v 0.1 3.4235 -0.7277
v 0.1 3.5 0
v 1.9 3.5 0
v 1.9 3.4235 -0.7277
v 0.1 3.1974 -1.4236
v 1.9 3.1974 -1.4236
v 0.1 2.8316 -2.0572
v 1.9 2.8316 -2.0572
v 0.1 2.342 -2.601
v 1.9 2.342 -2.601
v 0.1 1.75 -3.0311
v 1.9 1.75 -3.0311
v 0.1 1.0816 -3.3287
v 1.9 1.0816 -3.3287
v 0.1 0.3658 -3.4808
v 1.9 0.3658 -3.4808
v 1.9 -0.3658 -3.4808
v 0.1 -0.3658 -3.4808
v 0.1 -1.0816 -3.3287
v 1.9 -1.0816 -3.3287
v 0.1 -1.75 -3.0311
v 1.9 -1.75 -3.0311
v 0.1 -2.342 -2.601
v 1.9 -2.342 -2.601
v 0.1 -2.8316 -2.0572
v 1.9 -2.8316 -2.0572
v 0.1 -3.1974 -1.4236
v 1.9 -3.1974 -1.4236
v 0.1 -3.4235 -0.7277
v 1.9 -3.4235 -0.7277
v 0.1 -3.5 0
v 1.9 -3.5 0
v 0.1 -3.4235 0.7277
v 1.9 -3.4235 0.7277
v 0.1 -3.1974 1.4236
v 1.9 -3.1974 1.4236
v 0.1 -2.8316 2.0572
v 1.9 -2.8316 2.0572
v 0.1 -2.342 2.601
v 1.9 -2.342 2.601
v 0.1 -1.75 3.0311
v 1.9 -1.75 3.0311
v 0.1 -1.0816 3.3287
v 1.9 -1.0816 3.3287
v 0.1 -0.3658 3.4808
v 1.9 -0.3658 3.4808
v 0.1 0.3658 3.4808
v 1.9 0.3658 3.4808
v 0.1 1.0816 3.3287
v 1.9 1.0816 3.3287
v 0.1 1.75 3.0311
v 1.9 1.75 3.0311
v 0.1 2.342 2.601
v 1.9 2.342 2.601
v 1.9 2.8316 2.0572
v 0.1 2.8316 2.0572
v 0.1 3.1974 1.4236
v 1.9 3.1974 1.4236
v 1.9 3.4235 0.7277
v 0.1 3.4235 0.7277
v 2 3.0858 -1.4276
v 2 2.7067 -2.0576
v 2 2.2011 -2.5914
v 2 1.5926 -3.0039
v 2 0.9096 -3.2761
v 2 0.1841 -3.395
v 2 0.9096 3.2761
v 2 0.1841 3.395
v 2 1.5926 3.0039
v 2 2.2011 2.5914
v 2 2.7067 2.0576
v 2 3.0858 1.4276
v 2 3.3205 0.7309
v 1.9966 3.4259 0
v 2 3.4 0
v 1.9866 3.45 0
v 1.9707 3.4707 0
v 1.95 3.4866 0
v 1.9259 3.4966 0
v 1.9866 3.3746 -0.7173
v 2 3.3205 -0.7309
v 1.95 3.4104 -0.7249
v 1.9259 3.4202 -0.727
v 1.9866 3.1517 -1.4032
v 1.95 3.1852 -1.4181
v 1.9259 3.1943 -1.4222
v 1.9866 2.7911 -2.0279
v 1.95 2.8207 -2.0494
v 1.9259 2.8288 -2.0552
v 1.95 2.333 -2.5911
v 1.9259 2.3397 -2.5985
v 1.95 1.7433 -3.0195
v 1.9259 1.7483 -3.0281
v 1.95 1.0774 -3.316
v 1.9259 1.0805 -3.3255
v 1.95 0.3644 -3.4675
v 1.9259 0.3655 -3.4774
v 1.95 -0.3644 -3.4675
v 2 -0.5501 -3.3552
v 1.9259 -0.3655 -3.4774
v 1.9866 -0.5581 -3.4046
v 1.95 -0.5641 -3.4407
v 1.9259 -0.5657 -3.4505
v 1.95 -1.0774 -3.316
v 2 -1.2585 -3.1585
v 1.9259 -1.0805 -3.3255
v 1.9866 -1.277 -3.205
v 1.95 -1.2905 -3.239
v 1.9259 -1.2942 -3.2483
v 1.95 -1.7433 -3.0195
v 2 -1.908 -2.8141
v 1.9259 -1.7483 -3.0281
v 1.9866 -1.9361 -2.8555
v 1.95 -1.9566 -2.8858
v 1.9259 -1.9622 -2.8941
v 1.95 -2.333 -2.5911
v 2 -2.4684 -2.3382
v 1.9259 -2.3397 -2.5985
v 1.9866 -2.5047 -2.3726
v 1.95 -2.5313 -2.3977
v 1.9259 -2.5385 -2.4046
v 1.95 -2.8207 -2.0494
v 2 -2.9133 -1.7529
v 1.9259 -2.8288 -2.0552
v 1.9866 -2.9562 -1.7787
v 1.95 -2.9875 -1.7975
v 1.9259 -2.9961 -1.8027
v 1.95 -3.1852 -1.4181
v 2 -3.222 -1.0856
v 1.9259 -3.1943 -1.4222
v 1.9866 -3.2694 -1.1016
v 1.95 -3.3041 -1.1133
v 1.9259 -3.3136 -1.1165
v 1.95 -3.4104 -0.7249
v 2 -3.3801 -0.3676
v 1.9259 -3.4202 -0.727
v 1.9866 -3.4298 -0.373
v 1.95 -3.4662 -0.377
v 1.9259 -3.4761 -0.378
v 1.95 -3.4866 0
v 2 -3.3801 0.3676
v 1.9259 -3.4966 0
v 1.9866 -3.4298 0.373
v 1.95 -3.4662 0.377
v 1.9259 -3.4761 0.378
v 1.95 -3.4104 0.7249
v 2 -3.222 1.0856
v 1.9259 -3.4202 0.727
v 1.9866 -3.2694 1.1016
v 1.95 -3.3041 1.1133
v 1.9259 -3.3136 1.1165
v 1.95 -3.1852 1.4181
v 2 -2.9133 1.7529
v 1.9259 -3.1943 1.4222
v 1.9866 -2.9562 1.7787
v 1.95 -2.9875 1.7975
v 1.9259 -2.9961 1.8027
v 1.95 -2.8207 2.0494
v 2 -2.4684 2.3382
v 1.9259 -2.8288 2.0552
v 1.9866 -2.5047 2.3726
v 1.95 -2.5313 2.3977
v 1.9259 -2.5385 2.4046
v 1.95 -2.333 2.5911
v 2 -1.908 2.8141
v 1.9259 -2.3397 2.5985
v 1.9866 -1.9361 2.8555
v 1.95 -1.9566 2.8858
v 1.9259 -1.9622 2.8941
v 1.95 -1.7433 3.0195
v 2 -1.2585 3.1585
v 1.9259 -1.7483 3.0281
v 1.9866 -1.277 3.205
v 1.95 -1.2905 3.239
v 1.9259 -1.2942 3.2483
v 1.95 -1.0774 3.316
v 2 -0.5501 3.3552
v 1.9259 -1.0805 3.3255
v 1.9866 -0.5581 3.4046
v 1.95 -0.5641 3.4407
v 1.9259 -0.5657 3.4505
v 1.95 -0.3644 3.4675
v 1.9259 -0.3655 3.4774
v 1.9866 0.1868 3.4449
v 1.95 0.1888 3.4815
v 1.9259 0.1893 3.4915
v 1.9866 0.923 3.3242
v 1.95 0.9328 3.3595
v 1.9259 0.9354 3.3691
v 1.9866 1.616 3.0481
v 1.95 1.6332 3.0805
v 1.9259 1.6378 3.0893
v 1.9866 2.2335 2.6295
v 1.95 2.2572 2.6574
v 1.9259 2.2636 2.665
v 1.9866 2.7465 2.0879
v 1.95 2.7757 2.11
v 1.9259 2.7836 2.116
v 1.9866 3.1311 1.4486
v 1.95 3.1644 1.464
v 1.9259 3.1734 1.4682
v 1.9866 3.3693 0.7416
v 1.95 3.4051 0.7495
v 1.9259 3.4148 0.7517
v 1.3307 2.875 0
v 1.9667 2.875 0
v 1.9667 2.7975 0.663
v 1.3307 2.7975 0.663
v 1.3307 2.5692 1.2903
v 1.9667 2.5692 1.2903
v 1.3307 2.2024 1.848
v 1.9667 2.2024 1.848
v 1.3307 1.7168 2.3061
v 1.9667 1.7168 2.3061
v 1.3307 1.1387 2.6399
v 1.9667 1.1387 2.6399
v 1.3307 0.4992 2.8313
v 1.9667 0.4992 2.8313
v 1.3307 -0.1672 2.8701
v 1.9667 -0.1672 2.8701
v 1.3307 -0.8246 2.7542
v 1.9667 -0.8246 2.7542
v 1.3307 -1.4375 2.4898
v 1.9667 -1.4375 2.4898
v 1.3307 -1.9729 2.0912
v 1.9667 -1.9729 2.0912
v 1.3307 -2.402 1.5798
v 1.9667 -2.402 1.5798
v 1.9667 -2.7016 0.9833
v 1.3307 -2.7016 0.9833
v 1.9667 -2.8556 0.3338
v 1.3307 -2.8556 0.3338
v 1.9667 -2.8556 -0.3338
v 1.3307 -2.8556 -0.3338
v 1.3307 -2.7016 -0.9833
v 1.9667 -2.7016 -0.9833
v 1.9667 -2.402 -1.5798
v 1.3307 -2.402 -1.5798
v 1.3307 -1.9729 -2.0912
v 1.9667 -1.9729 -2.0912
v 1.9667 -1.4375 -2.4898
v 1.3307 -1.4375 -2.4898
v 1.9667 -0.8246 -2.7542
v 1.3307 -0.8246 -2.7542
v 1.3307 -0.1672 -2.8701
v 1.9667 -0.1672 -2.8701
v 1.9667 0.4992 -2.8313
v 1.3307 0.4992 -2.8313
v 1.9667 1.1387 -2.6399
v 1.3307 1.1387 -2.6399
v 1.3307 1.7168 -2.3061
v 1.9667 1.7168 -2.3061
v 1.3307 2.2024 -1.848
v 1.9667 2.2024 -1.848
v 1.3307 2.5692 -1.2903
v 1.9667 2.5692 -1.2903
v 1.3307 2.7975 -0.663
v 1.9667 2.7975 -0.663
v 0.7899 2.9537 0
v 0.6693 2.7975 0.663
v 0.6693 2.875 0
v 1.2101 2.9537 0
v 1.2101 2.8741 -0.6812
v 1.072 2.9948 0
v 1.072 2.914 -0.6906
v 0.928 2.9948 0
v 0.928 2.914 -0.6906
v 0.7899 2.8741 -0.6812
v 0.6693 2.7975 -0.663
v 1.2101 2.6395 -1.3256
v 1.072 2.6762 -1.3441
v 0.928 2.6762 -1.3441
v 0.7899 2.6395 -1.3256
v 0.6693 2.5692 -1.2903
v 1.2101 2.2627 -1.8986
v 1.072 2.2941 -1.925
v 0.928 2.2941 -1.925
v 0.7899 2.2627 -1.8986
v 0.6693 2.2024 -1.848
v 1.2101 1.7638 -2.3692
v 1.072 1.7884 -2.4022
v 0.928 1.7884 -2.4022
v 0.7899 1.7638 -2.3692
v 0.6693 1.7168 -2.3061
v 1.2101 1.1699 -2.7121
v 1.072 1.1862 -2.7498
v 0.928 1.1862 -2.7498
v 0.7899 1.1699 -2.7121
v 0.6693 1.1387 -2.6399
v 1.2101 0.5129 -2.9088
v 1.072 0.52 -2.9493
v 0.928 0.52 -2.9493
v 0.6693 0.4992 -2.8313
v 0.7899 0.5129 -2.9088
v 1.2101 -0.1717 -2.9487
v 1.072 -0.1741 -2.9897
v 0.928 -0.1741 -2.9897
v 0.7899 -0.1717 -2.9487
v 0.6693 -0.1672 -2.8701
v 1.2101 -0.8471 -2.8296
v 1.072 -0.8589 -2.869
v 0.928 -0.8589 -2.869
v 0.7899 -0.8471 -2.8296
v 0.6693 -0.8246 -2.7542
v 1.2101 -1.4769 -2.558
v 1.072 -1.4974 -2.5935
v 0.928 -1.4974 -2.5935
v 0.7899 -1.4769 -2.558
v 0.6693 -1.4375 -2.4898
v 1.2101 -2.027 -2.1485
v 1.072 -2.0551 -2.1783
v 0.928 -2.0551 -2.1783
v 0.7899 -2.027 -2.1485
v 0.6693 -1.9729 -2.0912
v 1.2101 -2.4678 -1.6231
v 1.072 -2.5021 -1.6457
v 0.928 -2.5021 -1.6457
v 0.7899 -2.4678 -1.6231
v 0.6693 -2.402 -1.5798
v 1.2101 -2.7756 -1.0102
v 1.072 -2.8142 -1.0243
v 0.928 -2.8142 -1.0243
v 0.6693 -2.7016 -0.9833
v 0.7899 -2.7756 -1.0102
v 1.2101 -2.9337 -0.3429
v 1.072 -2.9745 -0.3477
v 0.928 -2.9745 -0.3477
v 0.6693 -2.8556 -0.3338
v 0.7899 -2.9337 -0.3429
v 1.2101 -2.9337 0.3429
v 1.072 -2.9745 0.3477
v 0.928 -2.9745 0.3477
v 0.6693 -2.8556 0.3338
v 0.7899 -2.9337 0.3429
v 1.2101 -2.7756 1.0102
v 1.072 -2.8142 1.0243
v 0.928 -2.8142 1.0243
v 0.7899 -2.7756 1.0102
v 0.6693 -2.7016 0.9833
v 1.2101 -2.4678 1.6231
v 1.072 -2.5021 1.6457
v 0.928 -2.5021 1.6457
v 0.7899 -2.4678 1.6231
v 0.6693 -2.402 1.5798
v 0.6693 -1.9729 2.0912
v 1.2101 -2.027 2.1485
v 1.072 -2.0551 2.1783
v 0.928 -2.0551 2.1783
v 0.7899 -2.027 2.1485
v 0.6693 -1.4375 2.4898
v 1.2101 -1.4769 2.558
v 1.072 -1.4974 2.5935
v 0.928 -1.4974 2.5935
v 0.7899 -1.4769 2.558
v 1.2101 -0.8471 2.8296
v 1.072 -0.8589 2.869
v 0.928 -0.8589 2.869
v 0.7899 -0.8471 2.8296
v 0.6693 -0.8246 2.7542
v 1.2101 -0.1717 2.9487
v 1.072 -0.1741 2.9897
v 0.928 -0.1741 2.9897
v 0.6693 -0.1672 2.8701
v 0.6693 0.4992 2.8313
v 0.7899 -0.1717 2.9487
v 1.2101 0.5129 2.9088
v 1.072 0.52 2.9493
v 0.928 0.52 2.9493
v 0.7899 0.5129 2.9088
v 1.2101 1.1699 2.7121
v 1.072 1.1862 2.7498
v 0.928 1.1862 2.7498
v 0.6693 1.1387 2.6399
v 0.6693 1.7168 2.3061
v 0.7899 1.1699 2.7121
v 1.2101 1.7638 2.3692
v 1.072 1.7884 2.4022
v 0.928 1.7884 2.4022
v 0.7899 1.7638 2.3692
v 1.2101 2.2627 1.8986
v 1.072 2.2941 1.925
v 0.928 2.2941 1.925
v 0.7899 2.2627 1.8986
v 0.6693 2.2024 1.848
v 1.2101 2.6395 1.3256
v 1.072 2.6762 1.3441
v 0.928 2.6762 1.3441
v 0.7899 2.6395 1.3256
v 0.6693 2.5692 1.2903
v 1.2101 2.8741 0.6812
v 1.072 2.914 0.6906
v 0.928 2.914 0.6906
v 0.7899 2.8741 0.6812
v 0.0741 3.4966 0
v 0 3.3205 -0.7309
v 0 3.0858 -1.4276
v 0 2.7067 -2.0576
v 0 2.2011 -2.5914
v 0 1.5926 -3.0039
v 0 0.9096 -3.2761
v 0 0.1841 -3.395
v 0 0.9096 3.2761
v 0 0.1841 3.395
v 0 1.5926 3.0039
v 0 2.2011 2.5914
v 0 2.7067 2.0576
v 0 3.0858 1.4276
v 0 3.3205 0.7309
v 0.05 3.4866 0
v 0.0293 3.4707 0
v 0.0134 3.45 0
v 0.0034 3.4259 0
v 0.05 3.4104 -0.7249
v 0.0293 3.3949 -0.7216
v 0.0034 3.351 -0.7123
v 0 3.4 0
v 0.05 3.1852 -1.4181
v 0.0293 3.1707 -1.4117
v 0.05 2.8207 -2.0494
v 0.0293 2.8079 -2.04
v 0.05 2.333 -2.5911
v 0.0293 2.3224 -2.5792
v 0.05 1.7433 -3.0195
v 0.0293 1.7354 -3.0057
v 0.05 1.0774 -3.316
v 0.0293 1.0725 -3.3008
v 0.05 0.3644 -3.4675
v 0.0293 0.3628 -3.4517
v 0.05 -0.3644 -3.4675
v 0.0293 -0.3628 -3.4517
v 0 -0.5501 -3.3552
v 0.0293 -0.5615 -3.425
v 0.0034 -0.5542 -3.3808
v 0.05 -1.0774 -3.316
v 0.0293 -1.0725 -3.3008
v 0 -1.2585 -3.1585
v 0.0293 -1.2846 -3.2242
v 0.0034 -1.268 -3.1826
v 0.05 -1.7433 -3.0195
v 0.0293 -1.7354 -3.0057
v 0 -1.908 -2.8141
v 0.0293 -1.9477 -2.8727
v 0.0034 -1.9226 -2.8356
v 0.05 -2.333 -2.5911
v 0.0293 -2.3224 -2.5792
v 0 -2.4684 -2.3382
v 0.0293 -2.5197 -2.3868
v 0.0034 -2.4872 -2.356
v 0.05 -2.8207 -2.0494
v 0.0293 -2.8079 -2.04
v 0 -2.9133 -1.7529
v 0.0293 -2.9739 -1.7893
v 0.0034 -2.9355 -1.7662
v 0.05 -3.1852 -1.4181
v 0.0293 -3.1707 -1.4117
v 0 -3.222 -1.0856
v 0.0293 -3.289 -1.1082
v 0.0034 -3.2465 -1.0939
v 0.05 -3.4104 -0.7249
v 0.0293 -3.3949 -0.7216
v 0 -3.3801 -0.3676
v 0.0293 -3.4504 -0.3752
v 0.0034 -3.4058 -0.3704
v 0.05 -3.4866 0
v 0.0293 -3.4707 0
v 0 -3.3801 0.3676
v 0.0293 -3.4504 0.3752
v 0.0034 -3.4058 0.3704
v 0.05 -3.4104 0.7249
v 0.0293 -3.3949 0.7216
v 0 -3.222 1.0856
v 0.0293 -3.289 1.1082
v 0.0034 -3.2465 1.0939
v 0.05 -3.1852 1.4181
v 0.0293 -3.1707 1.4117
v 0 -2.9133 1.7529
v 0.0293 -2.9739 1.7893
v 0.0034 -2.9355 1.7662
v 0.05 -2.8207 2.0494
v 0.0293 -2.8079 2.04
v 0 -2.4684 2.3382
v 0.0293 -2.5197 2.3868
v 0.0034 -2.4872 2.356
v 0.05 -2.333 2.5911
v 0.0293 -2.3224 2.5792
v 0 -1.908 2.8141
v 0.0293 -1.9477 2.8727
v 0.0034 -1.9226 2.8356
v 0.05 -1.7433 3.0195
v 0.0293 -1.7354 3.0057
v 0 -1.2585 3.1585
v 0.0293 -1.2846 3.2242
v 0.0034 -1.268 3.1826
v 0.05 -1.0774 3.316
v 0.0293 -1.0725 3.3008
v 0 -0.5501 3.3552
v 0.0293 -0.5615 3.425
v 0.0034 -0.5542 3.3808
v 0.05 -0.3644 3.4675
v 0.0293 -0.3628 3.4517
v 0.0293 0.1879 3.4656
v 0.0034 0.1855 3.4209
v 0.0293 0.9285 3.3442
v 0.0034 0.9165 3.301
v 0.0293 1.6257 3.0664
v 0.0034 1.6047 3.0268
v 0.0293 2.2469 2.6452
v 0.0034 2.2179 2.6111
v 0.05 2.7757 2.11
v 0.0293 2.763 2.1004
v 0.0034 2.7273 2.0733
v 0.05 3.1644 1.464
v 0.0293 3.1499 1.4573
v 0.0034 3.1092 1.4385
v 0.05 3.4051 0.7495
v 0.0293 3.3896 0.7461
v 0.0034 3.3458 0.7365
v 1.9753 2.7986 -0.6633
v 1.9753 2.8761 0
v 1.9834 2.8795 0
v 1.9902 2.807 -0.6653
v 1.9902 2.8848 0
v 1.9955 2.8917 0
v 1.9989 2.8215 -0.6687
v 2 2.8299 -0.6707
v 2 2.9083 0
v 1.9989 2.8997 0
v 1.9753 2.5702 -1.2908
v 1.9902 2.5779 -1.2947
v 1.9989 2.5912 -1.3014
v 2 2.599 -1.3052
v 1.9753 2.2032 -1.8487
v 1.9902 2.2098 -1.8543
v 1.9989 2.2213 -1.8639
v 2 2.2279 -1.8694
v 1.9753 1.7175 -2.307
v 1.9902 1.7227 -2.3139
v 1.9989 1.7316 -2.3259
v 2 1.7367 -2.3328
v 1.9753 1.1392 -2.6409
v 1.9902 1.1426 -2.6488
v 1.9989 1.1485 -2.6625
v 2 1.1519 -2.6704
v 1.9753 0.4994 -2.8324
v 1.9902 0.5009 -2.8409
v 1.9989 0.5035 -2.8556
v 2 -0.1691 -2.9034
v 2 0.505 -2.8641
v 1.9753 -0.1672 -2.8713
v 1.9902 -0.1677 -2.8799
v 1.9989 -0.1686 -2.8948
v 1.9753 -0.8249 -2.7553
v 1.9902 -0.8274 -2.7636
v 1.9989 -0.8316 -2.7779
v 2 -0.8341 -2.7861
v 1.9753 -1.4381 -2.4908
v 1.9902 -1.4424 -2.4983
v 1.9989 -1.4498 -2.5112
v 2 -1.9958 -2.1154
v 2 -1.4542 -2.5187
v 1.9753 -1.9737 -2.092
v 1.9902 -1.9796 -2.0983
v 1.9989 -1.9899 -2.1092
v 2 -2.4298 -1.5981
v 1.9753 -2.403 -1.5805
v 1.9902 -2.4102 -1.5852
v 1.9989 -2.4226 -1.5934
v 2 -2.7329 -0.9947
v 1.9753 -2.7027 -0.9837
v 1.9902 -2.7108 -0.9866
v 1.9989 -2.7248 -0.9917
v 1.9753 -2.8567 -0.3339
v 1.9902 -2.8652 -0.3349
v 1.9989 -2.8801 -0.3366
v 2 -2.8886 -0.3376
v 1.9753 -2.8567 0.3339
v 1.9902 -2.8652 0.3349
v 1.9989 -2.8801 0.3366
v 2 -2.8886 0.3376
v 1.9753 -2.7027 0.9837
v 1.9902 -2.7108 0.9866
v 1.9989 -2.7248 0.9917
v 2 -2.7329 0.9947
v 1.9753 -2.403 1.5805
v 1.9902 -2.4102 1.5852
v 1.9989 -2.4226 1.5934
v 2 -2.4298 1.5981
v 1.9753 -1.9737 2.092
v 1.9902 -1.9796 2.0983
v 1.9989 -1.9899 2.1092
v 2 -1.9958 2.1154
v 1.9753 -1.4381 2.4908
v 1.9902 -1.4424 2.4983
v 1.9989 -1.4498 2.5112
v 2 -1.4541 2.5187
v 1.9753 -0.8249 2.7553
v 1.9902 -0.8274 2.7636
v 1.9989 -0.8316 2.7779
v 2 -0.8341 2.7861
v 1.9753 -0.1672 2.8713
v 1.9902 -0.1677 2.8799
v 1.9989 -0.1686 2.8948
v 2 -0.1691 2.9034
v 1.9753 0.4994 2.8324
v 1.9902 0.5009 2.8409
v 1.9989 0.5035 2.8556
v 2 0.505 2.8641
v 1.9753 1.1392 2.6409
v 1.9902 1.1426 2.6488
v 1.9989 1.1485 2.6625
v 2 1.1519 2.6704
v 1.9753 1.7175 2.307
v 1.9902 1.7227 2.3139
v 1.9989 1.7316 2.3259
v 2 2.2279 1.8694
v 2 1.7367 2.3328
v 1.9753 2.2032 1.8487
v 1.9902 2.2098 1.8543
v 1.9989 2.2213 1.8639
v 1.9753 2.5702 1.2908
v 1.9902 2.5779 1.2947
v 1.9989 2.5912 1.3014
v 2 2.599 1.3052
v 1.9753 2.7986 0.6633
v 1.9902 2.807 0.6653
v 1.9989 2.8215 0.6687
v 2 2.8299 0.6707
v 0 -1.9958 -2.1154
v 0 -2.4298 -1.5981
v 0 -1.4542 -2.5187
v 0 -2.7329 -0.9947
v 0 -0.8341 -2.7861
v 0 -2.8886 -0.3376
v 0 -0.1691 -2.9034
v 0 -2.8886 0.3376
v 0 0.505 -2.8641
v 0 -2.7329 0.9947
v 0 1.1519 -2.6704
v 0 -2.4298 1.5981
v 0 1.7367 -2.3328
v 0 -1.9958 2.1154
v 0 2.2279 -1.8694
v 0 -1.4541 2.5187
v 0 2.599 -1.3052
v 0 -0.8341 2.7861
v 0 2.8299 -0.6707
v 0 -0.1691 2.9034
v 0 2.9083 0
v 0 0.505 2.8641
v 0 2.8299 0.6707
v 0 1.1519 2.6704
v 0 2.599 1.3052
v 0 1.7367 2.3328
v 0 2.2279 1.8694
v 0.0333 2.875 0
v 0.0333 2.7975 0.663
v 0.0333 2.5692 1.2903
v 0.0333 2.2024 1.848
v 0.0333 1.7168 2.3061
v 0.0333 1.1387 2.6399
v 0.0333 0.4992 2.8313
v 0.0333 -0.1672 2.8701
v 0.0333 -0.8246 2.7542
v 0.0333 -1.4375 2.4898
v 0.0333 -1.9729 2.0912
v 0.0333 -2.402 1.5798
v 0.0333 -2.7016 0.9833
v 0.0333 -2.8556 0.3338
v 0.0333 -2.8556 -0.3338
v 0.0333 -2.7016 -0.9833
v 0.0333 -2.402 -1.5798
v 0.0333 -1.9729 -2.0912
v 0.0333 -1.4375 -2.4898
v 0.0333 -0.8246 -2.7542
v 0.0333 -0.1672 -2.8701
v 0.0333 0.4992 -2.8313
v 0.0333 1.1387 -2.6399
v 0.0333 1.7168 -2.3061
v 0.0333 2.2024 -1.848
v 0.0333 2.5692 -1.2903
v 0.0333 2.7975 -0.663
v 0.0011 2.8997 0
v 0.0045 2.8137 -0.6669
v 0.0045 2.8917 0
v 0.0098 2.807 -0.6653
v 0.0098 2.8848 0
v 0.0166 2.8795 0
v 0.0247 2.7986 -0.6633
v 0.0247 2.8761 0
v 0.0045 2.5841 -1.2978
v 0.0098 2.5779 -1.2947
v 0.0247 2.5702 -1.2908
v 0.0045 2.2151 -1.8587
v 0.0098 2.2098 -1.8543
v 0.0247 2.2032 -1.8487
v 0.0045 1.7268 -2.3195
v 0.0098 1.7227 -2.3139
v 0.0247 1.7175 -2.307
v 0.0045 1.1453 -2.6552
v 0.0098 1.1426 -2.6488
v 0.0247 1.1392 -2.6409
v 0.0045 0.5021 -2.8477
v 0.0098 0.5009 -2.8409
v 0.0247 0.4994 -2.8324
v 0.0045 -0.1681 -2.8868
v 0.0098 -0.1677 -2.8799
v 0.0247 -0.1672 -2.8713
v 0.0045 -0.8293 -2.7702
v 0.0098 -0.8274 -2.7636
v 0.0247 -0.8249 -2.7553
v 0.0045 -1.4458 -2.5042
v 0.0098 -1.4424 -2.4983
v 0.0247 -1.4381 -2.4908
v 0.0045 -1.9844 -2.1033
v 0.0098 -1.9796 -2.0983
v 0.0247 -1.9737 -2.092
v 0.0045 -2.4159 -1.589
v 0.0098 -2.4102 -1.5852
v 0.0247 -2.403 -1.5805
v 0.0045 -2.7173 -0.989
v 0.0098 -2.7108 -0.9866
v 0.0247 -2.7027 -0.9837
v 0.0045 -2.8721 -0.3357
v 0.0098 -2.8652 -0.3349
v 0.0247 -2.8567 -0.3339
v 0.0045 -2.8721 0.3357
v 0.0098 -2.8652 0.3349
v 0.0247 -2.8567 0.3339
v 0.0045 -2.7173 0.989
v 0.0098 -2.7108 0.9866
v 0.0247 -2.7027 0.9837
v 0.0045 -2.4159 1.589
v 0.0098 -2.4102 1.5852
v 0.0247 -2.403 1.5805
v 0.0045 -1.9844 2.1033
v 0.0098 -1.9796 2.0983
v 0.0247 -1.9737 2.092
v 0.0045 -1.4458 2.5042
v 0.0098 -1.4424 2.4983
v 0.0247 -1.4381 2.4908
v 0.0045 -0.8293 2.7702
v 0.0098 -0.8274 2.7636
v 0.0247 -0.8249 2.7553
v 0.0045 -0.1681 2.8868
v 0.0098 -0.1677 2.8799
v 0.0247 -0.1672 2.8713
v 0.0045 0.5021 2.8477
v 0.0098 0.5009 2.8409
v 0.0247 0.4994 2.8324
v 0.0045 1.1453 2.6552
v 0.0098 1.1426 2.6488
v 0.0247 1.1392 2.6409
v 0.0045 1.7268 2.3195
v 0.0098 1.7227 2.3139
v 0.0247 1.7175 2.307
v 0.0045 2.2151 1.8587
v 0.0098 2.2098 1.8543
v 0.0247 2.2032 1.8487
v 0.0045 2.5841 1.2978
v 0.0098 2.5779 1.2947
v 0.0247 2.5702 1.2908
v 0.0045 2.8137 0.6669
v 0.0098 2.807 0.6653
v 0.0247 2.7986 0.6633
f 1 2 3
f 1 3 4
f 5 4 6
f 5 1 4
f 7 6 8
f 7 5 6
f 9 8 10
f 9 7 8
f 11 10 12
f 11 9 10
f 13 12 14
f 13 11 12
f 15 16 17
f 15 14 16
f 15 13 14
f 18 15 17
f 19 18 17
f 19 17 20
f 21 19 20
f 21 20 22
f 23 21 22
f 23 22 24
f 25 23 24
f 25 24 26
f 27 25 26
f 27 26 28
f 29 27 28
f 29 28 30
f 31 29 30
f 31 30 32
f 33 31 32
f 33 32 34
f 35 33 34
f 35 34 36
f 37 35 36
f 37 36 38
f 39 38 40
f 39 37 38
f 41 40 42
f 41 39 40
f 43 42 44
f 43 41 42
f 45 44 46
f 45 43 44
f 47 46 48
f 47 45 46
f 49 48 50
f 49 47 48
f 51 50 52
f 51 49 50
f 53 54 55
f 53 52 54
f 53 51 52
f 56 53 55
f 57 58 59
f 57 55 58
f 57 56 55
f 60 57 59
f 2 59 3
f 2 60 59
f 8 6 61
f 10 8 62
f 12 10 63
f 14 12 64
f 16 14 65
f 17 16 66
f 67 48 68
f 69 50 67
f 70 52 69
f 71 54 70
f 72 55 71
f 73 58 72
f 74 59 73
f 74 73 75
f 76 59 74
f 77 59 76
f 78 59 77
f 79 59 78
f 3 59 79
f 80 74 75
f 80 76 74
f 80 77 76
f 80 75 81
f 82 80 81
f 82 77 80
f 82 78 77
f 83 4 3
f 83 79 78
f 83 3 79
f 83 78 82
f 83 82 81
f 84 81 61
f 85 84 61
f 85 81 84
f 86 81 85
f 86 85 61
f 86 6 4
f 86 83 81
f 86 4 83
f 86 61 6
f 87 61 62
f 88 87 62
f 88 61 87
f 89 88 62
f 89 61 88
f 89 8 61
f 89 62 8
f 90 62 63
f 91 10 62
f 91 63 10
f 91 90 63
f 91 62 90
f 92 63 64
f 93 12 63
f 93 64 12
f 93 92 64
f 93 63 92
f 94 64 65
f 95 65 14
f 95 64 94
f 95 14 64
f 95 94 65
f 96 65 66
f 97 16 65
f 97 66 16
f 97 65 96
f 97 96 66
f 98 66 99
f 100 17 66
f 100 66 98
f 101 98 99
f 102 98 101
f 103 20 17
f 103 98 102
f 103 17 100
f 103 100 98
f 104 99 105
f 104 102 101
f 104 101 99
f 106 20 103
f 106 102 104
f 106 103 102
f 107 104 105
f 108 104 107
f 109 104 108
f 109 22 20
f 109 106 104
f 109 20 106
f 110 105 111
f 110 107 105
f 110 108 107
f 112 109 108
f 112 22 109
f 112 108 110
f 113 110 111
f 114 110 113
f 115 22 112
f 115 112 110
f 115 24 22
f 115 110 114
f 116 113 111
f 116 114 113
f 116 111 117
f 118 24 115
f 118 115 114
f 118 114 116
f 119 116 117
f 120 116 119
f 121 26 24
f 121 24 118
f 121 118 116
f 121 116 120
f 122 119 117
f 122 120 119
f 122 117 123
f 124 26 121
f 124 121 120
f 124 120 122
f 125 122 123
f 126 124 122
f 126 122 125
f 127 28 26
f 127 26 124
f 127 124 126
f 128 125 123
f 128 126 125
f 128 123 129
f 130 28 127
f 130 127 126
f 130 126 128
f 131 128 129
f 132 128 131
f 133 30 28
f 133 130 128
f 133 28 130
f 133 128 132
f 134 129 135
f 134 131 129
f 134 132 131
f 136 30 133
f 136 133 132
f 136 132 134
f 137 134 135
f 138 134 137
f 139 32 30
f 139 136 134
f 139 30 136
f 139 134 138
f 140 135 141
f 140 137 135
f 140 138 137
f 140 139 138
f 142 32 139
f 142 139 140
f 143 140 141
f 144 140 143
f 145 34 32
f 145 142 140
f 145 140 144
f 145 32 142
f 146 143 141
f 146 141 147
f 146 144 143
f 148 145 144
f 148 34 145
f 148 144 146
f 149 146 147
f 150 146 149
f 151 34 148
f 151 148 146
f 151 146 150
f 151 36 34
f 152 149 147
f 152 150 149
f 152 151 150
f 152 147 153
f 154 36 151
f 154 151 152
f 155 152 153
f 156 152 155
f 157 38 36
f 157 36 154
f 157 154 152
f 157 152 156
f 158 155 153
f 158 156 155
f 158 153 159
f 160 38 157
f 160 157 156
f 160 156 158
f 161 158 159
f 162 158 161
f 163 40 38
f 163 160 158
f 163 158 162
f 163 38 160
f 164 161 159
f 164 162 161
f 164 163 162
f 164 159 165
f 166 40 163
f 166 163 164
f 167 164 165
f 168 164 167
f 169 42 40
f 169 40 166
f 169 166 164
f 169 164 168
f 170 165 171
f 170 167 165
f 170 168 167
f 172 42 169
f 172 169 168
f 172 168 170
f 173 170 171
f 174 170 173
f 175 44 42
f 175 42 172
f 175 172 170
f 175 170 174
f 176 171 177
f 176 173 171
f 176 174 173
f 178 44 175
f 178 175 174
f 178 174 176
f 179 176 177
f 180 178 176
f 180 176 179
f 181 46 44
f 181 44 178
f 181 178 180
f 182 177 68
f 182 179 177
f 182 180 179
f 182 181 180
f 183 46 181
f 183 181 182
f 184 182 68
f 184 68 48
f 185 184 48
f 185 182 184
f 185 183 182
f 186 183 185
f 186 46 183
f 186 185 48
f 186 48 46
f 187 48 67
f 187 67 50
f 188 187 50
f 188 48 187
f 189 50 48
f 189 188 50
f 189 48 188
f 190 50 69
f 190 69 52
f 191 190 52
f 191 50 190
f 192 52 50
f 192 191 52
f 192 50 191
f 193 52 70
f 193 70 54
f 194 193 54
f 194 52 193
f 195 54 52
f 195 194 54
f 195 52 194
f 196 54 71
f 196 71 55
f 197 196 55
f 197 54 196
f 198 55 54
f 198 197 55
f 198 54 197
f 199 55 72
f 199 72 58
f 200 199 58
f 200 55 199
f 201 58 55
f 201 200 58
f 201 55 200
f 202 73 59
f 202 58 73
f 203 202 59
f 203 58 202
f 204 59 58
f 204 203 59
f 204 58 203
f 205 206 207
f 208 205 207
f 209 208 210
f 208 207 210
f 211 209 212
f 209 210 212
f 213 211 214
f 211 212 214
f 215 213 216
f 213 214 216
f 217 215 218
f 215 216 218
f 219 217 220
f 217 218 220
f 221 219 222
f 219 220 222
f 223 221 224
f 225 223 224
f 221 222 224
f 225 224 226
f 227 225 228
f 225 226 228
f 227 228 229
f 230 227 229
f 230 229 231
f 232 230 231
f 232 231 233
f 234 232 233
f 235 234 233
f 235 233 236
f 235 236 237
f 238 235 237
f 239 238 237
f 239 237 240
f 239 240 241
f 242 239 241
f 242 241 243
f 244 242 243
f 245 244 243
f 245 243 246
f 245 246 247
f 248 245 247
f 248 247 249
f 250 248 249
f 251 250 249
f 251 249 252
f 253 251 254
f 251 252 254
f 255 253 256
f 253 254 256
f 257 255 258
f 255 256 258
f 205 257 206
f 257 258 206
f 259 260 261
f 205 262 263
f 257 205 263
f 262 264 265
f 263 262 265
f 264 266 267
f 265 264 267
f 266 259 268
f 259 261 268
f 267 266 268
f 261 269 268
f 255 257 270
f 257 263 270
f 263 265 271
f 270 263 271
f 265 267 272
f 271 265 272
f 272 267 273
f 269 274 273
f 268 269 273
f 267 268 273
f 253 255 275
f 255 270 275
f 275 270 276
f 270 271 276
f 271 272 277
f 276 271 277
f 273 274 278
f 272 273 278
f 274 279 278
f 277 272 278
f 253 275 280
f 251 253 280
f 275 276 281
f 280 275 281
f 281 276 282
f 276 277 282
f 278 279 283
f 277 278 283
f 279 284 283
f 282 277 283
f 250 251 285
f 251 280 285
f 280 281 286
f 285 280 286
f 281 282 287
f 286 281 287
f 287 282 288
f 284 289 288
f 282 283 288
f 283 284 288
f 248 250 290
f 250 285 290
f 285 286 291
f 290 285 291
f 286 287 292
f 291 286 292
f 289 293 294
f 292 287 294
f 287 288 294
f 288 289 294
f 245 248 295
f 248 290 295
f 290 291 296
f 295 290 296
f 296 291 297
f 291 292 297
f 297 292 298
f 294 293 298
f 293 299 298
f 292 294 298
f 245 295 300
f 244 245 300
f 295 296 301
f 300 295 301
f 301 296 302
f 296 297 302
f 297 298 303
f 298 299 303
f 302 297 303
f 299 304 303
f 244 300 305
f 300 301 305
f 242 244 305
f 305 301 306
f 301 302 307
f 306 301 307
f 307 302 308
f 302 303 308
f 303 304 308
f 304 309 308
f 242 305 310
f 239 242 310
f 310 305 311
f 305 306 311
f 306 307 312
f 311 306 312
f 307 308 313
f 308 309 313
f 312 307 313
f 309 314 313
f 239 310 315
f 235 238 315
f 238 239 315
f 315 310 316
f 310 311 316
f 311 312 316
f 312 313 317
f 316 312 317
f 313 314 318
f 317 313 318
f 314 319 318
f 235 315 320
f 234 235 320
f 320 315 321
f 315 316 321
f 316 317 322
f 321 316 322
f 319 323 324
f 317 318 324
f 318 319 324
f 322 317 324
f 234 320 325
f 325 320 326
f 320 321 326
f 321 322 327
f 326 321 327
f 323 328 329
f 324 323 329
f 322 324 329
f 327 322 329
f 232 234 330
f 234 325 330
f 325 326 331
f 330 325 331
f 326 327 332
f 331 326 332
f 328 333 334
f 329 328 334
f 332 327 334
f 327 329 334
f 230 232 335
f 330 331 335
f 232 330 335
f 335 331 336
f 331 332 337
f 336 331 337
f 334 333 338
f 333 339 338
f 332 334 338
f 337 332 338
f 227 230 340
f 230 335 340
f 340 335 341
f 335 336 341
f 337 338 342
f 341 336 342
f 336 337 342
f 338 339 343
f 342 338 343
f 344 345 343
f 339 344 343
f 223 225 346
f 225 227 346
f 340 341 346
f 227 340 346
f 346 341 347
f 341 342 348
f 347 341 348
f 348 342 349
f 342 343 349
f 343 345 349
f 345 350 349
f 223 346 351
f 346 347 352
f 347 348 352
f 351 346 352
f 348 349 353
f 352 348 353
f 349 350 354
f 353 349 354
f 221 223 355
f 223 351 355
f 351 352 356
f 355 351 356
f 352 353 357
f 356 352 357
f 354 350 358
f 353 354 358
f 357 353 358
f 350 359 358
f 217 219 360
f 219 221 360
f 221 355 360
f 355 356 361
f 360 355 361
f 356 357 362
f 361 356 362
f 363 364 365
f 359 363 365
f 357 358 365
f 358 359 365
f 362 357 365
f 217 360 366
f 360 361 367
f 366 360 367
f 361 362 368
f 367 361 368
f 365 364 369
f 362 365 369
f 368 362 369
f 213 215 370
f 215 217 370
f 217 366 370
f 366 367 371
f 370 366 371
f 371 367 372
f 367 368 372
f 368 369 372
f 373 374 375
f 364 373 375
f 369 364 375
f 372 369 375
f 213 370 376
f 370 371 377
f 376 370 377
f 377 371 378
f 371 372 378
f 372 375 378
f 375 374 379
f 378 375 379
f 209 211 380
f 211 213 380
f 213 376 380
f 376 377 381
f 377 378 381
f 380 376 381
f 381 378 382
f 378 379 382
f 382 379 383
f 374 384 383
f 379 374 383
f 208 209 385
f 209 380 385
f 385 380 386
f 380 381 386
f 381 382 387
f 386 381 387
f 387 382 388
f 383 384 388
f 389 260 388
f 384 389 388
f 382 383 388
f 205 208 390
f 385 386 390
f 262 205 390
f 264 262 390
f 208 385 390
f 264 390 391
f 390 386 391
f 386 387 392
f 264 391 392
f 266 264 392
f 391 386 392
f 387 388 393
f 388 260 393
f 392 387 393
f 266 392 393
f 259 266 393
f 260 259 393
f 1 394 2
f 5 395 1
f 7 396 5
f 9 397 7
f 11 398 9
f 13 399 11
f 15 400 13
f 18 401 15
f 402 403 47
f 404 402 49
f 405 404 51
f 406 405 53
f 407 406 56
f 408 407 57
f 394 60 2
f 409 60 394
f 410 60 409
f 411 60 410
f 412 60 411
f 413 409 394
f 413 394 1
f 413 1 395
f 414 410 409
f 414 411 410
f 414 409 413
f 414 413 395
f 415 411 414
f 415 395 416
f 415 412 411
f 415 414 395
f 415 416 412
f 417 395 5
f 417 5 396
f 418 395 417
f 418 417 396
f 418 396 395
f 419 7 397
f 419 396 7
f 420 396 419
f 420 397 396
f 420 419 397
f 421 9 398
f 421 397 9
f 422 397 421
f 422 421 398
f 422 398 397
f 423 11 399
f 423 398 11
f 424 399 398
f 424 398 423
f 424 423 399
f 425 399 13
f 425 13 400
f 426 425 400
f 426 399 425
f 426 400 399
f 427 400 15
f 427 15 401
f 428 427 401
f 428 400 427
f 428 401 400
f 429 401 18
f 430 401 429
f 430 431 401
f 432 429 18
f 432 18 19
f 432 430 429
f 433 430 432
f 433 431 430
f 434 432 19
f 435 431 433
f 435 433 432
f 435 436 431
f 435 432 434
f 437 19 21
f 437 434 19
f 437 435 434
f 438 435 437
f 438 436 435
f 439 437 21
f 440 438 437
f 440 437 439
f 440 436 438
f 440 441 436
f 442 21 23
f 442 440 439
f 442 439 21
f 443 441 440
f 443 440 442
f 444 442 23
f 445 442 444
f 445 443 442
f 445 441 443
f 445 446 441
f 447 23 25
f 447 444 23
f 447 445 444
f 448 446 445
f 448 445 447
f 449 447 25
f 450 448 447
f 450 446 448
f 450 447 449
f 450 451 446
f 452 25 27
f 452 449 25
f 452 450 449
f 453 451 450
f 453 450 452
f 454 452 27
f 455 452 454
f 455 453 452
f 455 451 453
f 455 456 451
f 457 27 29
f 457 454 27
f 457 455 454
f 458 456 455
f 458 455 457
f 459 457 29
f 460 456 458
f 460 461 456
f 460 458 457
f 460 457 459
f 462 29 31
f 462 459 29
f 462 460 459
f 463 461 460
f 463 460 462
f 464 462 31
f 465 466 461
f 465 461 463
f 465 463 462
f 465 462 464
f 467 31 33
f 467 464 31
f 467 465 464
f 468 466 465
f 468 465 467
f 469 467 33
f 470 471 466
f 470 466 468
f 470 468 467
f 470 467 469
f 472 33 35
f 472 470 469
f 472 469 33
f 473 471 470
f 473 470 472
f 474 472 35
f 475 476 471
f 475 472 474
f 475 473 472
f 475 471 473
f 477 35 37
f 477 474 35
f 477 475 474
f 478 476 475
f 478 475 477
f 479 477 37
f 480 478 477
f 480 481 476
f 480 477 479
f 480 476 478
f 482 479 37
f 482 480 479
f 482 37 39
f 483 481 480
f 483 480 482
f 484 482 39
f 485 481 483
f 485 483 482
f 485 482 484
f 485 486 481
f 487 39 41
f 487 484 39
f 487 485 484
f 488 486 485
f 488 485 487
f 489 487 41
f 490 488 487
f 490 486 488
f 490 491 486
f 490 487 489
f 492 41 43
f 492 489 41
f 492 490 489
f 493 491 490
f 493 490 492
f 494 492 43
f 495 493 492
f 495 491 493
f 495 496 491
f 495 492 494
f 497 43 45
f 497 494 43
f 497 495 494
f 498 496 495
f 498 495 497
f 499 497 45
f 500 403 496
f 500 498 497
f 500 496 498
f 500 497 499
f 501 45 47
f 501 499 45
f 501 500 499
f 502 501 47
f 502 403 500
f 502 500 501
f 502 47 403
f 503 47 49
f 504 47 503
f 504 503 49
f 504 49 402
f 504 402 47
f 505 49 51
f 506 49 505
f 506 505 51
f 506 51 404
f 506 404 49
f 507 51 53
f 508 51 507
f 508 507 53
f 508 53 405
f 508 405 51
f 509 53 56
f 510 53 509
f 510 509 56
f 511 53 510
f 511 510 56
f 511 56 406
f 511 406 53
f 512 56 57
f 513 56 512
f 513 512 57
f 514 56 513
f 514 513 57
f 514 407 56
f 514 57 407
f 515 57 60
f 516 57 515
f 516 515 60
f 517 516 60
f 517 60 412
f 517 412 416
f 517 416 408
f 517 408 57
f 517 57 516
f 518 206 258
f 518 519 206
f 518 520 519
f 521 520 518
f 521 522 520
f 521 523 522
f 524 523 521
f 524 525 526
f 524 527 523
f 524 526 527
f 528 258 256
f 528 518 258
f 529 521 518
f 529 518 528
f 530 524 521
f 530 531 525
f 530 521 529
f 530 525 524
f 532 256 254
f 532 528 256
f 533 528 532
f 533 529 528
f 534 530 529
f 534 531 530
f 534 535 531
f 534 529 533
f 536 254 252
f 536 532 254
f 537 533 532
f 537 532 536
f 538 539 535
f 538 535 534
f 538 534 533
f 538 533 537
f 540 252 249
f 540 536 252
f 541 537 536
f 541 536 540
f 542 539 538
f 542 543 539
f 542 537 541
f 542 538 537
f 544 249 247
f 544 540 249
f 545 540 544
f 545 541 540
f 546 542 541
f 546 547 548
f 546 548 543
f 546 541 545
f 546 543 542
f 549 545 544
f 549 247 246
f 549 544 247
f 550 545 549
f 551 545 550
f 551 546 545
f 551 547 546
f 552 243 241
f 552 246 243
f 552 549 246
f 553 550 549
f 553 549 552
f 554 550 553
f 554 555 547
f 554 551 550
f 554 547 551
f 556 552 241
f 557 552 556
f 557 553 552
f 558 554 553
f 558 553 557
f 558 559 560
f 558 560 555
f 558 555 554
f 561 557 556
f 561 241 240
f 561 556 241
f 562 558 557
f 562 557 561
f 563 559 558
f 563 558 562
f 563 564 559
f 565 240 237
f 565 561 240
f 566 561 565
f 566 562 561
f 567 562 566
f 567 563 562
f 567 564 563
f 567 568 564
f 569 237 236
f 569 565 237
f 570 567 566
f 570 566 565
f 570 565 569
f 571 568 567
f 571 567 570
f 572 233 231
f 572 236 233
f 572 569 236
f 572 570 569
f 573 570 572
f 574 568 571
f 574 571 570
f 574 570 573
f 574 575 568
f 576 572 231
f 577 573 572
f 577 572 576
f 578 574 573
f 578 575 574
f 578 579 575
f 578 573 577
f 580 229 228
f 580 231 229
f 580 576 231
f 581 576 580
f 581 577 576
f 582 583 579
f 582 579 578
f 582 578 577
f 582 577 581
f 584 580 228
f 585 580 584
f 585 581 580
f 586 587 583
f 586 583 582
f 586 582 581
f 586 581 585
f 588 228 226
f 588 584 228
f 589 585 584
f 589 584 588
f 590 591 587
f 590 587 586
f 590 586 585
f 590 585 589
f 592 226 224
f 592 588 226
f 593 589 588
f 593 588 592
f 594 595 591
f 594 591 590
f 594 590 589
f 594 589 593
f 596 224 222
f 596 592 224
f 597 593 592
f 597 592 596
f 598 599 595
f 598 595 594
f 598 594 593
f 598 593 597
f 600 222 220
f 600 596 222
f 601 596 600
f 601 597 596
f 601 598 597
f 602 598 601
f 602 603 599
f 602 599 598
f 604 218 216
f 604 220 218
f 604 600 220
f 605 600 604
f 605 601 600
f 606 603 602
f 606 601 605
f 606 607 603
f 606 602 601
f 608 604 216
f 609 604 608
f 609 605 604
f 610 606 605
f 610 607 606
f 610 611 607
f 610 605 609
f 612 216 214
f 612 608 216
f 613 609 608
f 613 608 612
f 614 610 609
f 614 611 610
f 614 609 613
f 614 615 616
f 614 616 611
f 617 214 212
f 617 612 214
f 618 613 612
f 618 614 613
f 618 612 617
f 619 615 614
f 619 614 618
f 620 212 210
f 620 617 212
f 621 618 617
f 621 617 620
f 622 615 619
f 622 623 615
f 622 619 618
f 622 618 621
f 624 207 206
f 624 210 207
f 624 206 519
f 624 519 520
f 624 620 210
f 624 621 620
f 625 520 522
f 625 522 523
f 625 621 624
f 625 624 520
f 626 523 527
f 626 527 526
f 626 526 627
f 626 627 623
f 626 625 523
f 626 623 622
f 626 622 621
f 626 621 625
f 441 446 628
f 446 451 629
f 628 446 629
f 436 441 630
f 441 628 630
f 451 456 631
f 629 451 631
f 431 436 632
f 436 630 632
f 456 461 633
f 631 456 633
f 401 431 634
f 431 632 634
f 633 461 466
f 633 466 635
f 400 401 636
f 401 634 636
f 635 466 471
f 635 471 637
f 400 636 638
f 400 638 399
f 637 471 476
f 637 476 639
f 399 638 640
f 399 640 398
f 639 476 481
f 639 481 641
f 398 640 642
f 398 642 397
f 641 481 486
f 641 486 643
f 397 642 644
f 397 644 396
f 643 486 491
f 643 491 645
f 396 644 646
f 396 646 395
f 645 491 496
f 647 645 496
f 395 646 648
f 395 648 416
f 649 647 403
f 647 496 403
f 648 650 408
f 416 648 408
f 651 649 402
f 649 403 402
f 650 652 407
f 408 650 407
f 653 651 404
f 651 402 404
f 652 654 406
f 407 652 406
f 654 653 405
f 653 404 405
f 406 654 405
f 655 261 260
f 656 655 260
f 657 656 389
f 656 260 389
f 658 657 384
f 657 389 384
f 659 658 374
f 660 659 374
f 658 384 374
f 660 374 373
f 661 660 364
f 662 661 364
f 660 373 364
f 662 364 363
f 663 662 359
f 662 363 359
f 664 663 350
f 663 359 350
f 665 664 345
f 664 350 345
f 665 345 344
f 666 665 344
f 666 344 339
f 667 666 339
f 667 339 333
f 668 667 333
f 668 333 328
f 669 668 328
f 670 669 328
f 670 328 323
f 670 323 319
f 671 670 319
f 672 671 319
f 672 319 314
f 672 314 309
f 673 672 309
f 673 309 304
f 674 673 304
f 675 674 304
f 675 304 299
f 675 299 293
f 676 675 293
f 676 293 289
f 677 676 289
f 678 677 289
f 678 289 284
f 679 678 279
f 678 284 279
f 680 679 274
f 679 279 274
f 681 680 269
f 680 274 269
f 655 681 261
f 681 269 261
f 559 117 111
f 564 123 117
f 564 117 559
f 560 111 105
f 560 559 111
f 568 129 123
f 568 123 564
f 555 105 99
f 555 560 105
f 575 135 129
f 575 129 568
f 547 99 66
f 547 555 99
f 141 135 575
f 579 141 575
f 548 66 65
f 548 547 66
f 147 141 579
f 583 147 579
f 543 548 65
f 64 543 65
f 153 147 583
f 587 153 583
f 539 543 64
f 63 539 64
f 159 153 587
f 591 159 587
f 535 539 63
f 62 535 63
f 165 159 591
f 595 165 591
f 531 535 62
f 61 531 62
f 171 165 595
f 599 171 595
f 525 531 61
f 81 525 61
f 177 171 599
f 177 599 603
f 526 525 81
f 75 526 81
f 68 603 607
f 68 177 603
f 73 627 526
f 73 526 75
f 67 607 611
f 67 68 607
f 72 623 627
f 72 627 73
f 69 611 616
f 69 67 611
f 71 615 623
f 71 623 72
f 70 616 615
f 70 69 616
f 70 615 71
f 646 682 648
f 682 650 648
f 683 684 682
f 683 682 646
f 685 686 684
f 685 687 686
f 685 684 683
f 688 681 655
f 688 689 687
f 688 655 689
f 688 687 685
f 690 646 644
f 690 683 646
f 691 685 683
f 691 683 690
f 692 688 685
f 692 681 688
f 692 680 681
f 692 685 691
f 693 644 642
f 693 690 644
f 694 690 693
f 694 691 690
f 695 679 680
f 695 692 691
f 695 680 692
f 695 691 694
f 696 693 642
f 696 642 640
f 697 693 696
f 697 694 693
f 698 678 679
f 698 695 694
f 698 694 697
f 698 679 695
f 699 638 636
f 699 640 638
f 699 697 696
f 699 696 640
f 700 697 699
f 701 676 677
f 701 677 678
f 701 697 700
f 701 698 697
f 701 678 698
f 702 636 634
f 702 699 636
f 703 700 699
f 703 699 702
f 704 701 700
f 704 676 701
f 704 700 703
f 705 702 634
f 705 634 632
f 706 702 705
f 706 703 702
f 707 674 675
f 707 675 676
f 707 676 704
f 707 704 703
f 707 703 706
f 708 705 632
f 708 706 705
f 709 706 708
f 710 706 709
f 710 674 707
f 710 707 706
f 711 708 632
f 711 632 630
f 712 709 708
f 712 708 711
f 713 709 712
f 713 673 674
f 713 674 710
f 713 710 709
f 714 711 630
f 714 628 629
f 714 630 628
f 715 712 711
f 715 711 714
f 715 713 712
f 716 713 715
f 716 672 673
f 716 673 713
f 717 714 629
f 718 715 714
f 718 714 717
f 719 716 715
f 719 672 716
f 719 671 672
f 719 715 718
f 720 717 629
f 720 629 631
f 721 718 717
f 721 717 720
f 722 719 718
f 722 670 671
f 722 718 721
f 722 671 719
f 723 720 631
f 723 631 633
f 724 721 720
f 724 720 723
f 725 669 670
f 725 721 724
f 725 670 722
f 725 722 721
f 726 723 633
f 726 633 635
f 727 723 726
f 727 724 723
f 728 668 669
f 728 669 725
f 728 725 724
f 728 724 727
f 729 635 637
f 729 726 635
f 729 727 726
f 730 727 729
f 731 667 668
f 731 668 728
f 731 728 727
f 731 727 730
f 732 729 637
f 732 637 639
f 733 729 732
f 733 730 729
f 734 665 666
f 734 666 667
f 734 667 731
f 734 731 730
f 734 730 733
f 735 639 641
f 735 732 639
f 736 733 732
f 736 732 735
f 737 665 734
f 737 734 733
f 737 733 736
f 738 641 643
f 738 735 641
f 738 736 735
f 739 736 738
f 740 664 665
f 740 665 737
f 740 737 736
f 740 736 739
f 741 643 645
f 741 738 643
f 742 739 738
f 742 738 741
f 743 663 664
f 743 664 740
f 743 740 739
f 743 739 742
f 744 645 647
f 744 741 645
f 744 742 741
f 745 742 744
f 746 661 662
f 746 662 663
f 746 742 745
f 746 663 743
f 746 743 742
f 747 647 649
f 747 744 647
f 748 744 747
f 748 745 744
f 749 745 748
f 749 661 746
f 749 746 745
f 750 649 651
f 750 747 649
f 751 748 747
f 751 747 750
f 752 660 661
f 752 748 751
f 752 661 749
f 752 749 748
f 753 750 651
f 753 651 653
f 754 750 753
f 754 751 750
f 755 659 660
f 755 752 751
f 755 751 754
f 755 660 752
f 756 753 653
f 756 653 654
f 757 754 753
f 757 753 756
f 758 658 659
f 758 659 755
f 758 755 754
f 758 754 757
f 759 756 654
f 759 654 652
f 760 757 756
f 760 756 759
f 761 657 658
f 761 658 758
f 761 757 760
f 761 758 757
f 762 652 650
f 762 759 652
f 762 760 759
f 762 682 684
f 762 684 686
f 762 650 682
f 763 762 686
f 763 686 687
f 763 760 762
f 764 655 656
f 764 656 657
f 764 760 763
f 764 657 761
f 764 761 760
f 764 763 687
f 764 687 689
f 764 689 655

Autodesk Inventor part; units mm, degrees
ref_plane "YZ Plane" through (0, 0, 0) normal (1, 0, 0) x (0, 1, 0)
ref_plane "XZ Plane" through (0, 0, 0) normal (0, 1, 0) x (-1, 0, 0)
ref_plane "XY Plane" through (0, 0, 0) normal (0, 0, 1) x (1, 0, 0)
sketch "Sketch_7" plane through (0, 0, 0) normal (0, 0, 1) x (1, 0, 0)
  line L0 (2, 0) -> (-2, 0)
  arc A0 (0, 2.9083) -> (0.0333, 2.875) centre (0.0333, 2.9083) ccw
  line L1 (0.0333, 2.875) -> (0.6693, 2.875)
  arc A1 (1.3307, 2.875) -> (0.6693, 2.875) centre (1, 2.5) ccw
  line L2 (1.3307, 2.875) -> (1.9667, 2.875)
  arc A2 (1.9667, 2.875) -> (2, 2.9083) centre (1.9667, 2.9083) ccw
  line L3 (2, 2.9083) -> (2, 3.4)
  arc A3 (2, 3.4) -> (1.9, 3.5) centre (1.9, 3.4) ccw
  line L4 (1.9, 3.5) -> (0.1, 3.5)
  arc A4 (0.1, 3.5) -> (0, 3.4) centre (0.1, 3.4) ccw
  line L5 (0, 3.4) -> (0, 2.9083)
revolve "Revolution1" add sketch "Sketch_7" angle 360 about axis through (2, 0, 0) along (1, 0, 0)
properties part number "W 618/3_PART2"
